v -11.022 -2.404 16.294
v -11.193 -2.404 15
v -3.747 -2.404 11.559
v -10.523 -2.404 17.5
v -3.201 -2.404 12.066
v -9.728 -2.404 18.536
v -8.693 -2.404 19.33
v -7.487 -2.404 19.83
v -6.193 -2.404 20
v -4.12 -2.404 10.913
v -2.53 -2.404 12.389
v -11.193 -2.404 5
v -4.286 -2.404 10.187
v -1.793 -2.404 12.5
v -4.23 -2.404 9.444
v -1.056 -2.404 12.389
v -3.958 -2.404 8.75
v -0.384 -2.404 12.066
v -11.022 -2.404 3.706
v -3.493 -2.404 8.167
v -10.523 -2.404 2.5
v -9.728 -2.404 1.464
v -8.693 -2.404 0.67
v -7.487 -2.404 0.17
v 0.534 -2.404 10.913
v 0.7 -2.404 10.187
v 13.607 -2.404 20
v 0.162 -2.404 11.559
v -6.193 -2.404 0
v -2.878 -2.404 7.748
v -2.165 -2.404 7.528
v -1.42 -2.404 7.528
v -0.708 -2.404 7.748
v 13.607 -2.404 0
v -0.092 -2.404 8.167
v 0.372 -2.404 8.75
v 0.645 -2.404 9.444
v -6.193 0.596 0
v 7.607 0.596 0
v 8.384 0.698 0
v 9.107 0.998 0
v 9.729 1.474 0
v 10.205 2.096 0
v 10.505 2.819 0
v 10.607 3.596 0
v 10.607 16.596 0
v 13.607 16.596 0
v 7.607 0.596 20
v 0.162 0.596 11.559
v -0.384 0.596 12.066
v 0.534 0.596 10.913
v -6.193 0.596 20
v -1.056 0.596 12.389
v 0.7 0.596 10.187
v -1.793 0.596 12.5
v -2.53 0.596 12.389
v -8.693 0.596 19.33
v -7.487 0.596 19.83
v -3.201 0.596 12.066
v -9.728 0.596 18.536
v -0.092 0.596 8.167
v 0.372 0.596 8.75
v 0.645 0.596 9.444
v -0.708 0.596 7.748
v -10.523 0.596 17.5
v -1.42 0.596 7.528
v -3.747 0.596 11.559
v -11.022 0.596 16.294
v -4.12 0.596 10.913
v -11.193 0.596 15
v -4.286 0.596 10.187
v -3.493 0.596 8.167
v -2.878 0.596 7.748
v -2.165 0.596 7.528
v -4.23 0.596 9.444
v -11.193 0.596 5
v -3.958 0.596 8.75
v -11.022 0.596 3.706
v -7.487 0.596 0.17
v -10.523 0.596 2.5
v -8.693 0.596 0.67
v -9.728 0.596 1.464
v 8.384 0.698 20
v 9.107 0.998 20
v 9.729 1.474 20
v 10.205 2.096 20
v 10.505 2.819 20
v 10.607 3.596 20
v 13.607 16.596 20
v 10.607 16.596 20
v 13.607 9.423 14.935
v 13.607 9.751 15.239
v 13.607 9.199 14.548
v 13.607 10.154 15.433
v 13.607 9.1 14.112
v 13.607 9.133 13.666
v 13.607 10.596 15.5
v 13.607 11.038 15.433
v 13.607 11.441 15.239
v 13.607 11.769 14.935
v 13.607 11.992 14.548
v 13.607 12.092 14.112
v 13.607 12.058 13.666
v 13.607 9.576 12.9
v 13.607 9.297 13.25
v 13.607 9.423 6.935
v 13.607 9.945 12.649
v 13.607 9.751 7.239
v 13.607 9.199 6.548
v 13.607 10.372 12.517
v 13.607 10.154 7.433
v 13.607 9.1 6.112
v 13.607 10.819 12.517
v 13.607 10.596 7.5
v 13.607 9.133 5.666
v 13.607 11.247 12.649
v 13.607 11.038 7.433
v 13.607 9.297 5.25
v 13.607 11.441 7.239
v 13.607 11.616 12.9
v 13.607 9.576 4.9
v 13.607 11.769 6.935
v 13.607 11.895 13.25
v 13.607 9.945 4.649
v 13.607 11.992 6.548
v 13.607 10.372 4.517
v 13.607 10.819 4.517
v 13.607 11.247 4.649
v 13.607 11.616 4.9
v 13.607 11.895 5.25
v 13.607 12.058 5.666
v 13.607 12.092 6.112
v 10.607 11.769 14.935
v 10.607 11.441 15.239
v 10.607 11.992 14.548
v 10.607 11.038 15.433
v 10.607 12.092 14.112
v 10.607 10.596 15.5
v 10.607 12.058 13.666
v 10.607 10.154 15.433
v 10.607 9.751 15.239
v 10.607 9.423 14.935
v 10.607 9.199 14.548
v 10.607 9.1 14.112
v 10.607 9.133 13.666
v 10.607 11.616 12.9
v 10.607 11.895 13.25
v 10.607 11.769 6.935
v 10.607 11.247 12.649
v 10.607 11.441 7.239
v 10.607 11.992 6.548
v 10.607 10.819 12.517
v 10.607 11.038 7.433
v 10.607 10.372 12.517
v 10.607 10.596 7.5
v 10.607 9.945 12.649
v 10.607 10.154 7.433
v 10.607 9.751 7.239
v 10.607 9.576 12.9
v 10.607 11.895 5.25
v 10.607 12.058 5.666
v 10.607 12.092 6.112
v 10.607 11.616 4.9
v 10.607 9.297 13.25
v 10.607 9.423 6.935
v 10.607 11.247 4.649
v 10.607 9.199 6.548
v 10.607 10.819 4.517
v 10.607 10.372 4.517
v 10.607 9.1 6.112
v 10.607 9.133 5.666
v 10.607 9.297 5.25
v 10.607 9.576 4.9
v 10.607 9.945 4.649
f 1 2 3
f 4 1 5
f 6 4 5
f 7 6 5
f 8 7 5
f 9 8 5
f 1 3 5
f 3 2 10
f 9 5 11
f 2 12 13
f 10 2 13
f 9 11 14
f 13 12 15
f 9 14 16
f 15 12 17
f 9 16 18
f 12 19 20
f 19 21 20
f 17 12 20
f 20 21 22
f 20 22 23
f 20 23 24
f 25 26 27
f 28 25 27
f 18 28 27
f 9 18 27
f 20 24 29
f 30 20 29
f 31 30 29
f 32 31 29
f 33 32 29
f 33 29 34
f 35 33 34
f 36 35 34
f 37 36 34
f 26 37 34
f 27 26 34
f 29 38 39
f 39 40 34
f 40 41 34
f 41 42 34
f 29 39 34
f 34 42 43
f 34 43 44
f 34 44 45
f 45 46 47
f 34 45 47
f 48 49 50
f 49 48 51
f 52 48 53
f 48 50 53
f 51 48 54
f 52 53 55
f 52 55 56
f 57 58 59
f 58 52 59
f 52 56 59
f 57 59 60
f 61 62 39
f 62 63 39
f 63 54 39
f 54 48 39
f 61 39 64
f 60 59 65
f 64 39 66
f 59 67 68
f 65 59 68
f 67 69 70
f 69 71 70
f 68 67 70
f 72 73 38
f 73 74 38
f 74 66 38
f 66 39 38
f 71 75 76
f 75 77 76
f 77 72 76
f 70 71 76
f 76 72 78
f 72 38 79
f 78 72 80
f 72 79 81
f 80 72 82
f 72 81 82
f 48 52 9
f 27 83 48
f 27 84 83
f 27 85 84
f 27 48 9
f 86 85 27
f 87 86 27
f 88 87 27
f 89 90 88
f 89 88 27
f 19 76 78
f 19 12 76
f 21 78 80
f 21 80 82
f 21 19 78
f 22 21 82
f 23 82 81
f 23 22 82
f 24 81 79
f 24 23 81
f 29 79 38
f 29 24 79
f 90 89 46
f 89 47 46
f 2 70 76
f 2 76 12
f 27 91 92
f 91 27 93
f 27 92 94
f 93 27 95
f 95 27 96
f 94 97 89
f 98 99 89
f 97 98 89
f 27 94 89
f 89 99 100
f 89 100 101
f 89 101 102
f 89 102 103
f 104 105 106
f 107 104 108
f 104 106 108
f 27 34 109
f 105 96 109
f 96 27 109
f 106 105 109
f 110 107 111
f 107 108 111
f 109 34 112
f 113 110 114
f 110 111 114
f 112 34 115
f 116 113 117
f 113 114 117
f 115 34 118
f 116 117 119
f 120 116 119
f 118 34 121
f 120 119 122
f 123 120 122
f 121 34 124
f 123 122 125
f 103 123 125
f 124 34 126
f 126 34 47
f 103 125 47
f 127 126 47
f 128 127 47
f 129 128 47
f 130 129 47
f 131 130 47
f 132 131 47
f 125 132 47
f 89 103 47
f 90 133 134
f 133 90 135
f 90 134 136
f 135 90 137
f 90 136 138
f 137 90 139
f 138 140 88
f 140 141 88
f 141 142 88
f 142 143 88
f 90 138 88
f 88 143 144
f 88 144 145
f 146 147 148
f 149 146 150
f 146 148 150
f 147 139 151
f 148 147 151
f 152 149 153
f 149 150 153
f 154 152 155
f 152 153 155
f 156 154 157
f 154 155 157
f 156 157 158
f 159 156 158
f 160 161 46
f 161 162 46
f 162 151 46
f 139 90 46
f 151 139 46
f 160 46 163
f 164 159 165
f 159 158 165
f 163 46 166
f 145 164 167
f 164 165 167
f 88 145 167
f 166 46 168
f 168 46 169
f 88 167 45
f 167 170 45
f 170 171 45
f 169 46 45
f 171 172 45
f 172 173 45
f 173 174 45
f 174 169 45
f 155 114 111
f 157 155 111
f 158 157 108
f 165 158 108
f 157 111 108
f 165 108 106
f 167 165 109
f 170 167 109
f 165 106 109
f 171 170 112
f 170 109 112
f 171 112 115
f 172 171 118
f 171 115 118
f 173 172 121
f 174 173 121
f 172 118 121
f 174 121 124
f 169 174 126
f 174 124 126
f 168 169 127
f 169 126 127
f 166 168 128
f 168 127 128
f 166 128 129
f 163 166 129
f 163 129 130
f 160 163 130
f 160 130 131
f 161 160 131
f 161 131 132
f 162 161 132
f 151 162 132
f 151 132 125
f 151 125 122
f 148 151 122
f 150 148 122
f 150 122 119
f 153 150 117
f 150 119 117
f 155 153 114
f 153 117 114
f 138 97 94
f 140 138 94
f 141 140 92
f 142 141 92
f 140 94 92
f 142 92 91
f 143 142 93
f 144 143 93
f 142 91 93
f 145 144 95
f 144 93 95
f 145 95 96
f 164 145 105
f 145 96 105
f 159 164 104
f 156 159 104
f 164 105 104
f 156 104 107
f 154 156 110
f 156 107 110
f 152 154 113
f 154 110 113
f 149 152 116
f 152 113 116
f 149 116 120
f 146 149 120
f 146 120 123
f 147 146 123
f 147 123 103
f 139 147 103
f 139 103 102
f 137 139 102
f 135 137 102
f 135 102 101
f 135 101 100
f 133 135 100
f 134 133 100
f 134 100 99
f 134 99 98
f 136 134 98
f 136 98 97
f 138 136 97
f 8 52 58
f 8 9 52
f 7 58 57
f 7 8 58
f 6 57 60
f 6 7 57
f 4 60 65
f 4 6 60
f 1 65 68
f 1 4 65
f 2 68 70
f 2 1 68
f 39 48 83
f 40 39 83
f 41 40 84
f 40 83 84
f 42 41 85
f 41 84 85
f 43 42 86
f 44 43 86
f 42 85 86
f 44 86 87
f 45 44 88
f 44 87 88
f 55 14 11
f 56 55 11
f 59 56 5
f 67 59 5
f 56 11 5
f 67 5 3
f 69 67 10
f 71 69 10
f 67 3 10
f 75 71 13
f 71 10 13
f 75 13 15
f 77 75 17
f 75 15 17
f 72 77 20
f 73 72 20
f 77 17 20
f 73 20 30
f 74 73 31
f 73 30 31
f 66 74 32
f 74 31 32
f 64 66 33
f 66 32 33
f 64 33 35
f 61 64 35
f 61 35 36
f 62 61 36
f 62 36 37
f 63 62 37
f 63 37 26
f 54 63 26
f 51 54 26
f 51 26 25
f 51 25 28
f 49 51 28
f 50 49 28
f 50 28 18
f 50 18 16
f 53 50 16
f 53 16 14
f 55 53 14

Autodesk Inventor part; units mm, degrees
ref_plane "YZ Plane" through (0, 0, 0) normal (1, 0, 0) x (0, 1, 0)
ref_plane "XZ Plane" through (0, 0, 0) normal (0, 1, 0) x (-1, 0, 0)
ref_plane "XY Plane" through (0, 0, 0) normal (0, 0, 1) x (1, 0, 0)
sketch "Szkic1" plane through (0, 0, 0) normal (0, 0, 1) x (1, 0, 0)
  line L0 (-11.1928, -2.4042) -> (13.6072, -2.4042)
  line L1 (13.6072, -2.4042) -> (13.6072, 16.5958)
  line L2 (13.6072, 16.5958) -> (10.6072, 16.5958)
  line L3 (10.6072, 16.5958) -> (10.6072, 0.5958)
  line L4 (10.6072, 0.5958) -> (-11.1928, 0.5958)
  line L5 (-11.1928, 0.5958) -> (-11.1928, -2.4042)
  point P0 (0, 0)
  dimension "d0" = 24.8
  dimension "d1" = 19
  dimension "d2" = 3
  dimension "d3" = 16
extrude "Wyciągnięcie proste1" add sketch "Szkic1" along normal blind 20
fillet "Zaokrąglenie1" radius 5 2 edges at (-11.1928, -0.9042, 20) (-11.1928, -0.9042, 0)
fillet "Zaokrąglenie2" radius 3 1 edges at (10.6072, 0.5958, 10)
sketch "Szkic2" plane through (-11.1928, 0.5958, 15) normal (0, 1, 0) x (1, 0, 0)
  line L0 (18.8, 15) -> (18.8, -5) projected
  line L1 (18.8, 15) -> (5, 15) projected
  arc A0 (5, 15) -> (0, 10) centre (5, 10) ccw projected
  line L2 (0, 10) -> (0, 0) projected
  arc A1 (0, 0) -> (5, -5) centre (5, 0) ccw projected
  line L3 (18.8, -5) -> (5, -5) projected
  point P0 (11.1928, 15)
  point P1 (9.4, 5)
  dimension "d8" = 10
  dimension "d9" = 18.8
  dimension "d10" = 9.4
hole "Otwór1" at (-1.7928, 0.5958, 10) direction (0, -1, 0) diameter 5 depth 8 tip angle 118
sketch "Szkic3" plane through (10.6072, 16.5958, 0) normal (-1, 0, 0) x (0, 0, 1)
  line L0 (20, -13) -> (0, -13) projected
  line L1 (20, 0) -> (20, -13) projected
  line L2 (0, 0) -> (20, 0) projected
  line L3 (0, 0) -> (0, -13) projected
  point P0 (0, -16.5958)
  point P1 (6, -6)
  point P2 (14, -6)
  dimension "d18" = 6
  dimension "d19" = 6
  dimension "d20" = 6
  dimension "d21" = 6
hole "Otwór2" at (10.6072, 10.5958, 6) at (10.6072, 10.5958, 14) direction (1, 0, 0) diameter 3 depth 8 tip angle 118
equation "\"d10\" = 0.5 * d9"
properties part number "CNCM_ALU_3mm_Y_Axis_Idler_Stiffener_Side"
